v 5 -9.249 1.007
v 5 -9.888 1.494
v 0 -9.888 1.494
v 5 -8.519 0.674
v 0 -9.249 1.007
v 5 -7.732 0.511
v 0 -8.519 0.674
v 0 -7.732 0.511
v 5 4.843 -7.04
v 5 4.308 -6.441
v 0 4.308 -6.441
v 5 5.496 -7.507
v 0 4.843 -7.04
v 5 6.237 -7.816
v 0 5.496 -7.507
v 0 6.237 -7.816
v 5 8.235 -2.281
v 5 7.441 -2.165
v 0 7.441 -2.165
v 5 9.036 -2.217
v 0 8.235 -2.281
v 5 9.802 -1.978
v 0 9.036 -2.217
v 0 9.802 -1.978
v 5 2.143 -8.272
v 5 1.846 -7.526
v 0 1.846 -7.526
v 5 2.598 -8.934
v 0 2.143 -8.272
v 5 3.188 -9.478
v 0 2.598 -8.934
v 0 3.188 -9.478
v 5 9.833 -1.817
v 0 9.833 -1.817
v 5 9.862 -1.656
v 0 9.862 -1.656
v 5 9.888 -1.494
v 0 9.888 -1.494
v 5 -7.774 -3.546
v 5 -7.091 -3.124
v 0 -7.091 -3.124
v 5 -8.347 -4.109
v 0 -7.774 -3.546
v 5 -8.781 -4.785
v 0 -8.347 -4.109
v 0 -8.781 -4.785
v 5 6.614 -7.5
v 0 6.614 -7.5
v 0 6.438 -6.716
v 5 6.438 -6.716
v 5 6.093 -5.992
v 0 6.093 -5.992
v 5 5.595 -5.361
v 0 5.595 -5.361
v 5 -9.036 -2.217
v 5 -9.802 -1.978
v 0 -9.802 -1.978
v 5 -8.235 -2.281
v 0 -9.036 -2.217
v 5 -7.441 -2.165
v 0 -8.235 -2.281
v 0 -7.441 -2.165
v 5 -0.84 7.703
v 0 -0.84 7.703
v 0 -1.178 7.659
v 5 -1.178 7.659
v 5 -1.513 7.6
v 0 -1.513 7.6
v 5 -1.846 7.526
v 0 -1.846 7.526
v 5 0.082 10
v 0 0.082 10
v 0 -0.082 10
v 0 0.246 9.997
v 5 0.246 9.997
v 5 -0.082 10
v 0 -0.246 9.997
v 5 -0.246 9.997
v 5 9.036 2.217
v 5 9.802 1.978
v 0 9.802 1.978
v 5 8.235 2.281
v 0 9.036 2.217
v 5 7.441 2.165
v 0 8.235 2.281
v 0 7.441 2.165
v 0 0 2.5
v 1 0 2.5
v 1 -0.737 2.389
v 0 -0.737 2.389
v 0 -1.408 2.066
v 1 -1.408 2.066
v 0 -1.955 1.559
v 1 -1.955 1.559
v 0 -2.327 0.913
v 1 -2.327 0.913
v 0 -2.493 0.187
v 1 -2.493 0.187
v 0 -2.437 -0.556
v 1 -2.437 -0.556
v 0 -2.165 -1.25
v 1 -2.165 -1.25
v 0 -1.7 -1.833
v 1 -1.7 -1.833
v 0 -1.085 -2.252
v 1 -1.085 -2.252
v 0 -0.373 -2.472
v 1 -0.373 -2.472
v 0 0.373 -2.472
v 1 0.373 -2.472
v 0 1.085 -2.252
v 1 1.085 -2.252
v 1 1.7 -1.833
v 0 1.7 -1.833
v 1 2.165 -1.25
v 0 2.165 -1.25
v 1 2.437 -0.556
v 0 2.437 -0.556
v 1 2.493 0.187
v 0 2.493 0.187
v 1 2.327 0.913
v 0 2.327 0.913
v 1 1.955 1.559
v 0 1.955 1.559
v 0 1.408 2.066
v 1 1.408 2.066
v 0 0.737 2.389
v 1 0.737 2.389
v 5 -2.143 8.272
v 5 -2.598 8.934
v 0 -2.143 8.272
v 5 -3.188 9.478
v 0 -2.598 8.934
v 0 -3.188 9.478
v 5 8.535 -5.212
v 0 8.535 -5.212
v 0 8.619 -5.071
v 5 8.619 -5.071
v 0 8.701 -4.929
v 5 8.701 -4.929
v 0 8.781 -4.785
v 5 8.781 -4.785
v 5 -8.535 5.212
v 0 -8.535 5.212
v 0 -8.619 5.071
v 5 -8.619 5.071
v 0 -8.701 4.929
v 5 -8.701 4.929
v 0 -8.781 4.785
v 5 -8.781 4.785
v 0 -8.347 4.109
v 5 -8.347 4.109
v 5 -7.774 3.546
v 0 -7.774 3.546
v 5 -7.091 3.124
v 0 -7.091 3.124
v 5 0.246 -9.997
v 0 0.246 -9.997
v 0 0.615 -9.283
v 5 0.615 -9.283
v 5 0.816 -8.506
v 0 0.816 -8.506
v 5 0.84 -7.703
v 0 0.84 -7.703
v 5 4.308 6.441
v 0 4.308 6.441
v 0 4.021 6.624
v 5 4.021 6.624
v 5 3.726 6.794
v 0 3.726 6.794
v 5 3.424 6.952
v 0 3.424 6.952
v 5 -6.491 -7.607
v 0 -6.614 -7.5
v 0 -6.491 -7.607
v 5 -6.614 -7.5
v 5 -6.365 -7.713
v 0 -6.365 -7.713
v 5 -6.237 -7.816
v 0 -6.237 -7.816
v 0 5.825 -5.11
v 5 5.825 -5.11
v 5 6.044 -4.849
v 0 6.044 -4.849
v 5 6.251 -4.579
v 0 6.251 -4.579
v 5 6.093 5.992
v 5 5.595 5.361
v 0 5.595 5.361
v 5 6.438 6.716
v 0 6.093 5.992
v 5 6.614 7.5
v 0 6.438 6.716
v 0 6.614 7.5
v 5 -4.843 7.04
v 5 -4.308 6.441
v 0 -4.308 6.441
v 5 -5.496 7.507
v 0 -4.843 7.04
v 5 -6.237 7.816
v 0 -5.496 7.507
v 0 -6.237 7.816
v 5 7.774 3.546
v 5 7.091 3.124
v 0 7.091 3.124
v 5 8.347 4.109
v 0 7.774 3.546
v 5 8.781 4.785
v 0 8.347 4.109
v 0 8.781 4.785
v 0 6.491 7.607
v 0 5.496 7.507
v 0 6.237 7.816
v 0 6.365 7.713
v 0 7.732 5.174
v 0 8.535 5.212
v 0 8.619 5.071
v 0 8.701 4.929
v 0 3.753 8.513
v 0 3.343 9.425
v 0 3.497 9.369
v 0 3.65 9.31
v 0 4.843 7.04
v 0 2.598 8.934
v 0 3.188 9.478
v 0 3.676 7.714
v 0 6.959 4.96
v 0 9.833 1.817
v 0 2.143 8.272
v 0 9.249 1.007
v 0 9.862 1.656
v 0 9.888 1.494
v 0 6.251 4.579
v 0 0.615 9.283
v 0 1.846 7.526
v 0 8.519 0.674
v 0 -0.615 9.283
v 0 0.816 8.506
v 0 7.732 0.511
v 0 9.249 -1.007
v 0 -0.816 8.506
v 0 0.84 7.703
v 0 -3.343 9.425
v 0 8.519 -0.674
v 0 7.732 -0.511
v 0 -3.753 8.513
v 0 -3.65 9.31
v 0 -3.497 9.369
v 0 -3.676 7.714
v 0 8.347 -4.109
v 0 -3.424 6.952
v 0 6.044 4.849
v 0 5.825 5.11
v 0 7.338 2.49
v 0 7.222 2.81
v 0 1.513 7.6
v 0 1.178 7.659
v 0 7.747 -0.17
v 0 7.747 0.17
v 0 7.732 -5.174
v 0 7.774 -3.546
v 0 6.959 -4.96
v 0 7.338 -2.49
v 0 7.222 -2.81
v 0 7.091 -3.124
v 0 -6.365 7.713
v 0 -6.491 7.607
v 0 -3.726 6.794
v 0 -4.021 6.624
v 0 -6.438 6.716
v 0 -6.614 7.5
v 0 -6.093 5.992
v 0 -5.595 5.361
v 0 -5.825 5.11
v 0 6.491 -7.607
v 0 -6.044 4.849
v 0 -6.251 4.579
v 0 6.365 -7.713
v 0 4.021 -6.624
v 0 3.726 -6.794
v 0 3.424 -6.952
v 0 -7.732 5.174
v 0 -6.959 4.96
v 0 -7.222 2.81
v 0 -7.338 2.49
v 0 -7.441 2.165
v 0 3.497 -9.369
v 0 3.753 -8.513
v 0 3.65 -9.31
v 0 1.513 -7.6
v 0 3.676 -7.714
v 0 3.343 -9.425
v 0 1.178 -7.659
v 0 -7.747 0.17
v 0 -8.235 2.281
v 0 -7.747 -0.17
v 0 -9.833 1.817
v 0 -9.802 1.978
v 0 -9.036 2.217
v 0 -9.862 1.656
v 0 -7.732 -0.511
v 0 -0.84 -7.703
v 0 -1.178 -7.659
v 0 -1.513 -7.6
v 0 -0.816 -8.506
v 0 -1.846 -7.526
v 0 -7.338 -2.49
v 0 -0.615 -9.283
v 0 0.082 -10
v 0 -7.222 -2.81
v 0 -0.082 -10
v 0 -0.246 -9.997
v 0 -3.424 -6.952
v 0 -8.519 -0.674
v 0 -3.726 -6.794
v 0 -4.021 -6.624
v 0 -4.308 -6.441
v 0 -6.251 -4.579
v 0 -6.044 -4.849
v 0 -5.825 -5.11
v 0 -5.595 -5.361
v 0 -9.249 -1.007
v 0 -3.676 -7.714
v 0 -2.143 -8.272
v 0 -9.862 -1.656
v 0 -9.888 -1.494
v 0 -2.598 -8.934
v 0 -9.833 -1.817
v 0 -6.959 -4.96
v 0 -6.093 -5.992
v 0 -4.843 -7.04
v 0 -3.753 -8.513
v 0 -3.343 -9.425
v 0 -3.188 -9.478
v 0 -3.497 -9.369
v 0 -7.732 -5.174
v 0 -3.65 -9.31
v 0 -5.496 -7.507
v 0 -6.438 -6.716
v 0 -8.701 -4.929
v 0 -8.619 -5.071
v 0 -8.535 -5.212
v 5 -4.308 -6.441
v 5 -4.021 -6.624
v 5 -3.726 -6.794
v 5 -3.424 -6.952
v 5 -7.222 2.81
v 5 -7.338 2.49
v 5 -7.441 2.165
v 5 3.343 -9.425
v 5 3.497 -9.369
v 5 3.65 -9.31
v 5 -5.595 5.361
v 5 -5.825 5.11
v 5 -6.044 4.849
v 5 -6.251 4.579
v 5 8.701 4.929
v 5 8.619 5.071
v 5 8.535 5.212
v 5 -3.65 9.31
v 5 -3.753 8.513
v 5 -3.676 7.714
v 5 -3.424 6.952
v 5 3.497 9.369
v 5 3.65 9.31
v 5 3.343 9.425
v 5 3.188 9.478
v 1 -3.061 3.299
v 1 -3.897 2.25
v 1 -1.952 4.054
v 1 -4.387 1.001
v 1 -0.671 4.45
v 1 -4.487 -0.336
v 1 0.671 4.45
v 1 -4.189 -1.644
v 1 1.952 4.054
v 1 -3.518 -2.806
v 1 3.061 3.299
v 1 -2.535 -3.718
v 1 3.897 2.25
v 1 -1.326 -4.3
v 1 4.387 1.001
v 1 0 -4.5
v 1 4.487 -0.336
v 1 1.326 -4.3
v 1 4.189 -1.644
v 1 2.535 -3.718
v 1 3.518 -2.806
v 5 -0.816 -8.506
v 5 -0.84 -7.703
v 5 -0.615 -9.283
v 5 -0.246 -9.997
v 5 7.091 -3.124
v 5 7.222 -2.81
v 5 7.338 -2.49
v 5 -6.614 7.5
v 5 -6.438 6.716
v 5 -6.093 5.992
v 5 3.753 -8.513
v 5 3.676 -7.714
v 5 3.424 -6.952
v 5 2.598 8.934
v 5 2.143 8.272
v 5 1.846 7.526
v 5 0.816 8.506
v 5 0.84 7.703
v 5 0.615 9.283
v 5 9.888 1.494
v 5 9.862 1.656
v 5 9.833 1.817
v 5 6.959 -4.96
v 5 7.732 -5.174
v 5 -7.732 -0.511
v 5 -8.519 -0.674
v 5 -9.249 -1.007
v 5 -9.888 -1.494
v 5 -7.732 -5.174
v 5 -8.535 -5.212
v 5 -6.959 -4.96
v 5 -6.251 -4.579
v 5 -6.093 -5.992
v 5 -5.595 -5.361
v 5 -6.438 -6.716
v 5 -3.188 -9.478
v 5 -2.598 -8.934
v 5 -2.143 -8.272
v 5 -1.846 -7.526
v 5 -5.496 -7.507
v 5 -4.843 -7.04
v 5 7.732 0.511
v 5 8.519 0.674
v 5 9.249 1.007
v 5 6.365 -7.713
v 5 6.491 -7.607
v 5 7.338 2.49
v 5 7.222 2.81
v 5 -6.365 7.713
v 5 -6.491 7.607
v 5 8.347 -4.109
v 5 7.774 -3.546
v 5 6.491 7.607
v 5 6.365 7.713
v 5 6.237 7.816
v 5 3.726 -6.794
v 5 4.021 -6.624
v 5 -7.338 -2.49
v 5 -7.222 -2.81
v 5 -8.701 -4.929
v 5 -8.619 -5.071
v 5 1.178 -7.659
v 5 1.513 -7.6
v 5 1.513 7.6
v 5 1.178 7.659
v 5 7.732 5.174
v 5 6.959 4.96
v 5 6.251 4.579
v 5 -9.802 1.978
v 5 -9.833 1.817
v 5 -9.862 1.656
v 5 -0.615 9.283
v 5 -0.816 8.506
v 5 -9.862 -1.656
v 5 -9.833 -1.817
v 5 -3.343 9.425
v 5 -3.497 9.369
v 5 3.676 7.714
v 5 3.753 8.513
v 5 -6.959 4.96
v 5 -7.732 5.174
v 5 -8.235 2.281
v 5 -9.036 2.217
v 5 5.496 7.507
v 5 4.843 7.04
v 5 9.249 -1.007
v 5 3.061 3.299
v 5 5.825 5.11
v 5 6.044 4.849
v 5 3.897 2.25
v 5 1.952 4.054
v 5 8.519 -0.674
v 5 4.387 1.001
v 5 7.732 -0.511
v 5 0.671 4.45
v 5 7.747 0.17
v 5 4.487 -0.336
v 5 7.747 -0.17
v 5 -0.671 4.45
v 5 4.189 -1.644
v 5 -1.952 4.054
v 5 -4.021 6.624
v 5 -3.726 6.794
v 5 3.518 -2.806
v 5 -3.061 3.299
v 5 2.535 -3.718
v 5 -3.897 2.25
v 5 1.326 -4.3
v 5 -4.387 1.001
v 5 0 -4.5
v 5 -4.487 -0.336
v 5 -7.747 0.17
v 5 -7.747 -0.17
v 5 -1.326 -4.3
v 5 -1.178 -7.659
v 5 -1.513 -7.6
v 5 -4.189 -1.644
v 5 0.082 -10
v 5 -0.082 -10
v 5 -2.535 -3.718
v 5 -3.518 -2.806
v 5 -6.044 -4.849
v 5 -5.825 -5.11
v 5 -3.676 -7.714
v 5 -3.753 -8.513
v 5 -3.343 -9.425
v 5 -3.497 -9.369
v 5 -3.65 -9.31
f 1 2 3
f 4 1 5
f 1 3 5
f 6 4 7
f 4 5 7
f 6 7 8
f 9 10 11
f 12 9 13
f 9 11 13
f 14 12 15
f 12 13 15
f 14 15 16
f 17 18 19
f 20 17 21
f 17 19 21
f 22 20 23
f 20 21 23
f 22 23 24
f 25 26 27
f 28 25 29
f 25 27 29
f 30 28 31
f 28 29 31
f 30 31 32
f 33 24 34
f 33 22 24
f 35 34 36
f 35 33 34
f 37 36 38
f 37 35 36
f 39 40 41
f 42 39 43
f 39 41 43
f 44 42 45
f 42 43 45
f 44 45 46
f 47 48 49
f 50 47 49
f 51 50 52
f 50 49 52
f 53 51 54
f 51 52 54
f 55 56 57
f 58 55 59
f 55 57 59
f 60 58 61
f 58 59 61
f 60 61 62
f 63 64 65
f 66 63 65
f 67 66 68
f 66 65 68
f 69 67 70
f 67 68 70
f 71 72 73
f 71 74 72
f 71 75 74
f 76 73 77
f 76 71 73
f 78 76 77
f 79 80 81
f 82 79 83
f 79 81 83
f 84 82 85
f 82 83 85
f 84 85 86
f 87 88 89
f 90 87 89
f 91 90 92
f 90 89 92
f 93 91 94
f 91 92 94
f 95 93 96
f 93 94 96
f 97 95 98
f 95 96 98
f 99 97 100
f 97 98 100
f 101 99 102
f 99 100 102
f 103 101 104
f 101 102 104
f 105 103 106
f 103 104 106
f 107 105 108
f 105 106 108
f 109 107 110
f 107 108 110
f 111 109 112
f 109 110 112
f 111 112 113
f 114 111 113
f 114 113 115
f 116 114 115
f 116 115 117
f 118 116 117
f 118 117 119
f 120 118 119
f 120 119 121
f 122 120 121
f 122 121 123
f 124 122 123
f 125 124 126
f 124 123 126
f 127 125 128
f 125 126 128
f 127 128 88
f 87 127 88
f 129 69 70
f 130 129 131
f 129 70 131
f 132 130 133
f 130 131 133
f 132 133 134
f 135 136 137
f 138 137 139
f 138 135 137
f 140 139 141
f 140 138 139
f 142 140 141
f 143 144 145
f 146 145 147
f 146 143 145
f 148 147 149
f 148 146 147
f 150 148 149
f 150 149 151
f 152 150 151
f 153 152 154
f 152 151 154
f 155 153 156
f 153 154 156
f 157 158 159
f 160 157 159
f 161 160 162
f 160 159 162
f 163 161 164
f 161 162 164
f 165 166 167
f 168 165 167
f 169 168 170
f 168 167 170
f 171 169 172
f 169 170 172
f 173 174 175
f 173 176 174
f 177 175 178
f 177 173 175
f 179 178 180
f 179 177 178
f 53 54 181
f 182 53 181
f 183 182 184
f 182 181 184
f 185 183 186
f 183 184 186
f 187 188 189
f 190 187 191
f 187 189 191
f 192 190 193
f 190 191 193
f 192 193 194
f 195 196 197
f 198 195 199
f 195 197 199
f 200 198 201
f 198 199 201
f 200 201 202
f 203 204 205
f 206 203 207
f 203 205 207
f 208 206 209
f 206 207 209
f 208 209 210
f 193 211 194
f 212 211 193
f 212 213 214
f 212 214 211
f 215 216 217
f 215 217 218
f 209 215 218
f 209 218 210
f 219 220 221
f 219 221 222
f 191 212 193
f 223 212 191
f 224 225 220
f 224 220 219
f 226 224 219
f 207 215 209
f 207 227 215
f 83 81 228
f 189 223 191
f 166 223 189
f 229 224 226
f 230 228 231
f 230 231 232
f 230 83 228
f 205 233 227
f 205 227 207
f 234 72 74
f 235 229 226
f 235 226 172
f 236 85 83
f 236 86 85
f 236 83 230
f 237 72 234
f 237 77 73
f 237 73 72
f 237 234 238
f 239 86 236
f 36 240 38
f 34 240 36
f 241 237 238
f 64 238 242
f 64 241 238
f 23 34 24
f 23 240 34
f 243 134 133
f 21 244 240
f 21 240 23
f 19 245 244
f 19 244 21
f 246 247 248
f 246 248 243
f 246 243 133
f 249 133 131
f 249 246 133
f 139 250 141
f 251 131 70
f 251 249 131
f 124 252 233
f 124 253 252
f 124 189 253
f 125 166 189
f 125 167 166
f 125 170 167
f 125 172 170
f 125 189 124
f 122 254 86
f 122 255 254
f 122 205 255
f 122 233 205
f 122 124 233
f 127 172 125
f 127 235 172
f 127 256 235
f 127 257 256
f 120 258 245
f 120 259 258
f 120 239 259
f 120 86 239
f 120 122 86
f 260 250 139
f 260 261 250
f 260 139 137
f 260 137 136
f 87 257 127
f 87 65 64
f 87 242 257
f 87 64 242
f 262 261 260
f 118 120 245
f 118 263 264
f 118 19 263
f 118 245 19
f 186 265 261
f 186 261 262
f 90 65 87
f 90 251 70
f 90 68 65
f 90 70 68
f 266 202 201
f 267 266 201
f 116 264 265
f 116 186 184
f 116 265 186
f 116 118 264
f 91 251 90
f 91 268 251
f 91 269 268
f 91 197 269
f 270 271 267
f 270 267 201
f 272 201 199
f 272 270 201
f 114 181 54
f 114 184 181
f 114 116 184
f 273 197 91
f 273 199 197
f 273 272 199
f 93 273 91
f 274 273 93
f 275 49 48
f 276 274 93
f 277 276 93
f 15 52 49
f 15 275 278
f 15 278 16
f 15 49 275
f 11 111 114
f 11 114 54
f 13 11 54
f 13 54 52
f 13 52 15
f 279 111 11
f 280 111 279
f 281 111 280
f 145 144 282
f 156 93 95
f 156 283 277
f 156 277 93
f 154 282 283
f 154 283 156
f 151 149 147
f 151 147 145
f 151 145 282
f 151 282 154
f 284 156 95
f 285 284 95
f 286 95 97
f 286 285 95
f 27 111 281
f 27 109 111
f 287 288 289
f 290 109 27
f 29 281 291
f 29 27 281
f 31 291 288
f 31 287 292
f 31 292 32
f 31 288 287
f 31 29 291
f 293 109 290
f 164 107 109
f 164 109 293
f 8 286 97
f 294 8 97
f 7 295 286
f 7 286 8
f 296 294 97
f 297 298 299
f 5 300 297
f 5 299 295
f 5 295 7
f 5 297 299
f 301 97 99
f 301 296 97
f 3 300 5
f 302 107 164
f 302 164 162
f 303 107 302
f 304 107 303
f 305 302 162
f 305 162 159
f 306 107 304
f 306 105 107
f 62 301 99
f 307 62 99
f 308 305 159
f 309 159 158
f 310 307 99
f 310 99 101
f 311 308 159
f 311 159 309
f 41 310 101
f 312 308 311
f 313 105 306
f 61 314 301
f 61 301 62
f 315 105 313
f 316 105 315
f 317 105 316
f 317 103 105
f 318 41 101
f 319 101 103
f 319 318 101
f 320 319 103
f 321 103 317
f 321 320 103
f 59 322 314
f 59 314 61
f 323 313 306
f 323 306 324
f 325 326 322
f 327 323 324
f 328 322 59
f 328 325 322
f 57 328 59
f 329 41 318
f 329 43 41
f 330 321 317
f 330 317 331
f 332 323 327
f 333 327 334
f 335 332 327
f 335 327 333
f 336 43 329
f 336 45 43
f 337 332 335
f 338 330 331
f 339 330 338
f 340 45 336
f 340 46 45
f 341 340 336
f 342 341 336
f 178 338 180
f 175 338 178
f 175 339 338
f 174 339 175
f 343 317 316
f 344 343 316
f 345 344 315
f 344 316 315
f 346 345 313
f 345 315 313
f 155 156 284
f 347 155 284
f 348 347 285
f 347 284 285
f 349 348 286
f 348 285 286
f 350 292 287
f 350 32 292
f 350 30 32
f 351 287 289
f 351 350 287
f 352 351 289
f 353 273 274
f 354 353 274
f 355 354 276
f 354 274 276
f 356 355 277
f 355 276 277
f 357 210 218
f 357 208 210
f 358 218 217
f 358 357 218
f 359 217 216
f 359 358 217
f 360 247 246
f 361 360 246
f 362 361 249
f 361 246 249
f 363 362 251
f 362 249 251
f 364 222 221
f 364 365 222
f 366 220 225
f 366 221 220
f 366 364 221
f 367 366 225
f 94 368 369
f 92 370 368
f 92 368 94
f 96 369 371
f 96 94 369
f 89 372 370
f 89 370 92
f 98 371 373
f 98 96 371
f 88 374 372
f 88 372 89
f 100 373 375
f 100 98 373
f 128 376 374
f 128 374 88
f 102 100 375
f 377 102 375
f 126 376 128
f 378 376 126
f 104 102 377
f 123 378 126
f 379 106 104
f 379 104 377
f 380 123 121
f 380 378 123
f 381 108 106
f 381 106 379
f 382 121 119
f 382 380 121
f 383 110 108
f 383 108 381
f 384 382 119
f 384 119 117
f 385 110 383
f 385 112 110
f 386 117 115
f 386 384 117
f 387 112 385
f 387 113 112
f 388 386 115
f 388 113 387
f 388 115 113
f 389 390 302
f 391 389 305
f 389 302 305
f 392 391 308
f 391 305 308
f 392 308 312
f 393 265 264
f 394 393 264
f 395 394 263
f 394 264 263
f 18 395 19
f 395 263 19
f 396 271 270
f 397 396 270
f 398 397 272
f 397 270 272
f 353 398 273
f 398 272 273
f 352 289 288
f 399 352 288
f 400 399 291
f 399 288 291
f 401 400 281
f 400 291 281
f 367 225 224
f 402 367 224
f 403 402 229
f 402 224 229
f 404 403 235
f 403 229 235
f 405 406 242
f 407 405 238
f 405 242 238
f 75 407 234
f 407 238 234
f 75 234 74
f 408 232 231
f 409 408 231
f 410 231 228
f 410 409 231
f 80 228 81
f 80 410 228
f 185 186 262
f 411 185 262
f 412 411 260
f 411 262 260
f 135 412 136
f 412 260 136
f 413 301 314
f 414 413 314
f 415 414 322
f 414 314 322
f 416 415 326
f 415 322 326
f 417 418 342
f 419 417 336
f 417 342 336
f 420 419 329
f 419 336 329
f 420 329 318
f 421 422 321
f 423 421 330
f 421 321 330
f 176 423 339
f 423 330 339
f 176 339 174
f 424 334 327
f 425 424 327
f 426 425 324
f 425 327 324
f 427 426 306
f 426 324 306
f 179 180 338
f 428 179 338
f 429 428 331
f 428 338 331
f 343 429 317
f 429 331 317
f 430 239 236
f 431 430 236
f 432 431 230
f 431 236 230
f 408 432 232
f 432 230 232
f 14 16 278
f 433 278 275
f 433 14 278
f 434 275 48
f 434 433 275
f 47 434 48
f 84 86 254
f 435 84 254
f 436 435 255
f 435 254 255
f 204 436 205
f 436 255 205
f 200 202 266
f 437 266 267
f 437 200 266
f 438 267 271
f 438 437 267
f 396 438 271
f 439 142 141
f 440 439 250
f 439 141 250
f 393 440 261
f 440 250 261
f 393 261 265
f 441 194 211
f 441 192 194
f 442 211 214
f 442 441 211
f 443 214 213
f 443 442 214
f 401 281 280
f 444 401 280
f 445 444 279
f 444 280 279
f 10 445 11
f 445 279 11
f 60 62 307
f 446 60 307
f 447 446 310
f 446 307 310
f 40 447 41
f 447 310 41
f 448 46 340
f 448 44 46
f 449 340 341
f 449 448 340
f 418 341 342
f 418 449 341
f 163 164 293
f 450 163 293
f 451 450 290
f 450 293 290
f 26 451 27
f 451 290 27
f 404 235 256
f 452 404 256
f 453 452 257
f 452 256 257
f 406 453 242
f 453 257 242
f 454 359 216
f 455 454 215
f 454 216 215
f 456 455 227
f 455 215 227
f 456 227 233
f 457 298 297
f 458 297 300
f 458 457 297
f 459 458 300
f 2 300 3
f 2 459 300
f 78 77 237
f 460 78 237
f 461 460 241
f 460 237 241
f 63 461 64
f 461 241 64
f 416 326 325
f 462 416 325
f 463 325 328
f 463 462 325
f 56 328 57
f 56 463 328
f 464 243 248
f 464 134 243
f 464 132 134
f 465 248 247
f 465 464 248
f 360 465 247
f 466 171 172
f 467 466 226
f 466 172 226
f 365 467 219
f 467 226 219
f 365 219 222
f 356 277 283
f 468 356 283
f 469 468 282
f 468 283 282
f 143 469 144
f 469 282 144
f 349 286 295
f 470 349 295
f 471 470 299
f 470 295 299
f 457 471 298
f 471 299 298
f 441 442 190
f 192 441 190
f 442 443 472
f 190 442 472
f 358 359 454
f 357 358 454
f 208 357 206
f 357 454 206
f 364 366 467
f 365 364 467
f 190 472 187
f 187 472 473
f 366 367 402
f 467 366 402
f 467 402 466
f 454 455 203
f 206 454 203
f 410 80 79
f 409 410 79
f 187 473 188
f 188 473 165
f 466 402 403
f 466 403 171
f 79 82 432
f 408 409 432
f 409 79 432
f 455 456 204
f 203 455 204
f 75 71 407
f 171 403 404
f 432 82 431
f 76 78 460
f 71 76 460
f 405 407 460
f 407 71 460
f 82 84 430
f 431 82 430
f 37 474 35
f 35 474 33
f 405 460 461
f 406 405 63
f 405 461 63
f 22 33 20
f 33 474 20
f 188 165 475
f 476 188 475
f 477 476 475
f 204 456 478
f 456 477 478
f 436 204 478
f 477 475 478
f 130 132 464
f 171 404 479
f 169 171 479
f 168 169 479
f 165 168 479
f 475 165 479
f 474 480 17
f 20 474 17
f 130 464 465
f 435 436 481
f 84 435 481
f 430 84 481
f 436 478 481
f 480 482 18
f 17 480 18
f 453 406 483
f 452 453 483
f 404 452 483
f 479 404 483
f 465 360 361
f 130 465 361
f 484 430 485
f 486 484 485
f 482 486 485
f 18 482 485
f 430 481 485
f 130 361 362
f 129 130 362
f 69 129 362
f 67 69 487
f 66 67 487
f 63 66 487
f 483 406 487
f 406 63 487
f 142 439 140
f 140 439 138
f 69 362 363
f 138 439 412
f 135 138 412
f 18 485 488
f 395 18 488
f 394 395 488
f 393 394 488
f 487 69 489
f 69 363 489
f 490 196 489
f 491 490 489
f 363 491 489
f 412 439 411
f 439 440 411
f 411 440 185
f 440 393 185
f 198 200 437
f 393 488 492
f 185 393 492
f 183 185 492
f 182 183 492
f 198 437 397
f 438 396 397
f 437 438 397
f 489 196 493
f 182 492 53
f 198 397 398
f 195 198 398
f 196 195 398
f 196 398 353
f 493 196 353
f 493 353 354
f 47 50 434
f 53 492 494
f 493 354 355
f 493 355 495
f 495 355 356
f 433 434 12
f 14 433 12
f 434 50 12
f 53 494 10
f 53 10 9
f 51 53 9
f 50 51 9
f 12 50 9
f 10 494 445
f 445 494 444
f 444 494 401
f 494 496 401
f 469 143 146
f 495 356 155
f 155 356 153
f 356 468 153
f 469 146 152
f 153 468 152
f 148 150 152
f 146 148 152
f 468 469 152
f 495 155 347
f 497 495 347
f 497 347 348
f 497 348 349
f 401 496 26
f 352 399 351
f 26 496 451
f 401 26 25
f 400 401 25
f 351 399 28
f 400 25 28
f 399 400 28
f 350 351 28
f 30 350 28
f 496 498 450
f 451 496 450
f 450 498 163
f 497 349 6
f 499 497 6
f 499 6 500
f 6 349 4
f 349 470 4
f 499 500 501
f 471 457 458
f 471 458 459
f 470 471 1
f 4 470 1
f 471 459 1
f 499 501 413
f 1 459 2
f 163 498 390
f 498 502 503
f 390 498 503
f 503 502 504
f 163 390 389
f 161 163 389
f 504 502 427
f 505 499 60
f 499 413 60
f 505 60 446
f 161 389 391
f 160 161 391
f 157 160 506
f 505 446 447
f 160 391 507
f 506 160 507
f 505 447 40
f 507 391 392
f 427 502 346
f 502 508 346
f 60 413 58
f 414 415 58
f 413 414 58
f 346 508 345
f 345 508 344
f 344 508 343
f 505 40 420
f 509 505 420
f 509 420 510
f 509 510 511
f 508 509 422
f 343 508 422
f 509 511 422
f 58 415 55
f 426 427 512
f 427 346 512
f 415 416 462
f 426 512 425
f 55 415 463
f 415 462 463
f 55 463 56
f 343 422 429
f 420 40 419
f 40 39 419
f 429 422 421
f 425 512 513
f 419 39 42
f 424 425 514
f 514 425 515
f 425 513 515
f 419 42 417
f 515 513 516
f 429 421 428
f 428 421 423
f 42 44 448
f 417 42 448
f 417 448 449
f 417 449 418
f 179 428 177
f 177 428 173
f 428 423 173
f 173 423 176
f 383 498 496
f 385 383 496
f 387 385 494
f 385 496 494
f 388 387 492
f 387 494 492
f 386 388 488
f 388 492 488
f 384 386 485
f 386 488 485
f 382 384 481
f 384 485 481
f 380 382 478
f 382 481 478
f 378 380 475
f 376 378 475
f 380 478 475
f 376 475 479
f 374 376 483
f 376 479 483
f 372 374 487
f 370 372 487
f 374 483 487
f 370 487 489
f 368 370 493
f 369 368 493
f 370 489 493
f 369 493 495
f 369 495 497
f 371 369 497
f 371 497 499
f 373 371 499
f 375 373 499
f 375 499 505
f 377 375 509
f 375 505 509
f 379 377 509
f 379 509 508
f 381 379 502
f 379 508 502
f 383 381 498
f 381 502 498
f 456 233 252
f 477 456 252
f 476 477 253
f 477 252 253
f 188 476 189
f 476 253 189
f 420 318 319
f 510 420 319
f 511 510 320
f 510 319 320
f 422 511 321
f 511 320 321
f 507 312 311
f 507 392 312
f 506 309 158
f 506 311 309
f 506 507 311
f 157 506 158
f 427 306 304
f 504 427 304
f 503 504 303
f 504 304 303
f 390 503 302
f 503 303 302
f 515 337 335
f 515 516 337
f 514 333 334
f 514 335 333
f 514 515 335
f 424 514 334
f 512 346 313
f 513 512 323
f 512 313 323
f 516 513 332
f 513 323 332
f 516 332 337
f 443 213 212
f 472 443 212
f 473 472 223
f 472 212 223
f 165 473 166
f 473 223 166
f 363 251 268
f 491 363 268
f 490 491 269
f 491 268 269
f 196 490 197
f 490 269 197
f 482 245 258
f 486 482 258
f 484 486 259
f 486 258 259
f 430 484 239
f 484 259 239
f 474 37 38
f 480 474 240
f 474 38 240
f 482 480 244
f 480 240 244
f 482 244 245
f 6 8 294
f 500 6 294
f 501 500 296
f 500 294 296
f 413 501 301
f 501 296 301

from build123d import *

# Parameters (mm, degrees)
BASPROSKE_W        = 5
BASPROSKE_H        = 10
TOOTHCUT_DEPTH     = 16
TEETHCUTS_COUNT    = 18
TEETHCUTS_ANGLE    = 340
BORSKE_R           = 2.5
BORE_DEPTH         = 50.0000508
SKETCH1_R          = 4.5
CUT_EXTRUDE1_DEPTH = 4


with BuildPart() as part:
    # BasProSke → Base-Revolve (revolve)
    with BuildSketch(Plane(origin=(0, 0, 0), x_dir=(1, 0, 0), z_dir=(0, 1, 0)), mode=Mode.PRIVATE) as base_revolve_sk:
        with Locations((2.5, 5)):
            Rectangle(BASPROSKE_W, BASPROSKE_H)
    revolve(base_revolve_sk.sketch.rotate(Axis((-10, 0, 0), (1, 0, 0)), 180), axis=Axis((-10, 0, 0), (1, 0, 0)))

    # TooCutSke → ToothCut (cut, through all)
    with BuildSketch(Plane(origin=(0, 0, 0), x_dir=(0, 0, -1), z_dir=(1, 0, 0))):
        with BuildLine():
            ThreePointArc((0.510641536, 7.732156635), (0, 7.749), (-0.510641536, 7.732156635))
            ThreePointArc((-0.510641536, 7.732156635), (-0.82619259, 8.907320741), (-1.515208602, 9.910236529))
            ThreePointArc((-1.515208602, 9.910236529), (0, 10.0254), (1.515208602, 9.910236529))
            ThreePointArc((1.515208602, 9.910236529), (0.82619259, 8.907320741), (0.510641536, 7.732156635))
        make_face()
    toothcut = extrude(amount=TOOTHCUT_DEPTH, mode=Mode.SUBTRACT)

    # TeethCuts: ToothCut ×18 about axis
    teethcuts_axis = Axis((-10, 0, 0), (1, 0, 0))
    for i in range(1, TEETHCUTS_COUNT):
        add(toothcut.rotate(teethcuts_axis, i * TEETHCUTS_ANGLE / (TEETHCUTS_COUNT - 1)), mode=Mode.SUBTRACT)

    # BorSke → Bore (cut, symmetric)
    with BuildSketch(Plane(origin=(0, 0, 0), x_dir=(0, 0, -1), z_dir=(1, 0, 0))):
        with Locations(Location((0, 0, 0), (0, 0, 180))):
            Circle(BORSKE_R)
    extrude(amount=BORE_DEPTH, both=True, mode=Mode.SUBTRACT)

    # Sketch1 → Cut-Extrude1 (cut)
    with BuildSketch(Plane(origin=(5, 0, 0), x_dir=(0, 0, -1), z_dir=(1, 0, 0))):
        Circle(SKETCH1_R)
    extrude(amount=-CUT_EXTRUDE1_DEPTH, mode=Mode.SUBTRACT)


solid = part.part
